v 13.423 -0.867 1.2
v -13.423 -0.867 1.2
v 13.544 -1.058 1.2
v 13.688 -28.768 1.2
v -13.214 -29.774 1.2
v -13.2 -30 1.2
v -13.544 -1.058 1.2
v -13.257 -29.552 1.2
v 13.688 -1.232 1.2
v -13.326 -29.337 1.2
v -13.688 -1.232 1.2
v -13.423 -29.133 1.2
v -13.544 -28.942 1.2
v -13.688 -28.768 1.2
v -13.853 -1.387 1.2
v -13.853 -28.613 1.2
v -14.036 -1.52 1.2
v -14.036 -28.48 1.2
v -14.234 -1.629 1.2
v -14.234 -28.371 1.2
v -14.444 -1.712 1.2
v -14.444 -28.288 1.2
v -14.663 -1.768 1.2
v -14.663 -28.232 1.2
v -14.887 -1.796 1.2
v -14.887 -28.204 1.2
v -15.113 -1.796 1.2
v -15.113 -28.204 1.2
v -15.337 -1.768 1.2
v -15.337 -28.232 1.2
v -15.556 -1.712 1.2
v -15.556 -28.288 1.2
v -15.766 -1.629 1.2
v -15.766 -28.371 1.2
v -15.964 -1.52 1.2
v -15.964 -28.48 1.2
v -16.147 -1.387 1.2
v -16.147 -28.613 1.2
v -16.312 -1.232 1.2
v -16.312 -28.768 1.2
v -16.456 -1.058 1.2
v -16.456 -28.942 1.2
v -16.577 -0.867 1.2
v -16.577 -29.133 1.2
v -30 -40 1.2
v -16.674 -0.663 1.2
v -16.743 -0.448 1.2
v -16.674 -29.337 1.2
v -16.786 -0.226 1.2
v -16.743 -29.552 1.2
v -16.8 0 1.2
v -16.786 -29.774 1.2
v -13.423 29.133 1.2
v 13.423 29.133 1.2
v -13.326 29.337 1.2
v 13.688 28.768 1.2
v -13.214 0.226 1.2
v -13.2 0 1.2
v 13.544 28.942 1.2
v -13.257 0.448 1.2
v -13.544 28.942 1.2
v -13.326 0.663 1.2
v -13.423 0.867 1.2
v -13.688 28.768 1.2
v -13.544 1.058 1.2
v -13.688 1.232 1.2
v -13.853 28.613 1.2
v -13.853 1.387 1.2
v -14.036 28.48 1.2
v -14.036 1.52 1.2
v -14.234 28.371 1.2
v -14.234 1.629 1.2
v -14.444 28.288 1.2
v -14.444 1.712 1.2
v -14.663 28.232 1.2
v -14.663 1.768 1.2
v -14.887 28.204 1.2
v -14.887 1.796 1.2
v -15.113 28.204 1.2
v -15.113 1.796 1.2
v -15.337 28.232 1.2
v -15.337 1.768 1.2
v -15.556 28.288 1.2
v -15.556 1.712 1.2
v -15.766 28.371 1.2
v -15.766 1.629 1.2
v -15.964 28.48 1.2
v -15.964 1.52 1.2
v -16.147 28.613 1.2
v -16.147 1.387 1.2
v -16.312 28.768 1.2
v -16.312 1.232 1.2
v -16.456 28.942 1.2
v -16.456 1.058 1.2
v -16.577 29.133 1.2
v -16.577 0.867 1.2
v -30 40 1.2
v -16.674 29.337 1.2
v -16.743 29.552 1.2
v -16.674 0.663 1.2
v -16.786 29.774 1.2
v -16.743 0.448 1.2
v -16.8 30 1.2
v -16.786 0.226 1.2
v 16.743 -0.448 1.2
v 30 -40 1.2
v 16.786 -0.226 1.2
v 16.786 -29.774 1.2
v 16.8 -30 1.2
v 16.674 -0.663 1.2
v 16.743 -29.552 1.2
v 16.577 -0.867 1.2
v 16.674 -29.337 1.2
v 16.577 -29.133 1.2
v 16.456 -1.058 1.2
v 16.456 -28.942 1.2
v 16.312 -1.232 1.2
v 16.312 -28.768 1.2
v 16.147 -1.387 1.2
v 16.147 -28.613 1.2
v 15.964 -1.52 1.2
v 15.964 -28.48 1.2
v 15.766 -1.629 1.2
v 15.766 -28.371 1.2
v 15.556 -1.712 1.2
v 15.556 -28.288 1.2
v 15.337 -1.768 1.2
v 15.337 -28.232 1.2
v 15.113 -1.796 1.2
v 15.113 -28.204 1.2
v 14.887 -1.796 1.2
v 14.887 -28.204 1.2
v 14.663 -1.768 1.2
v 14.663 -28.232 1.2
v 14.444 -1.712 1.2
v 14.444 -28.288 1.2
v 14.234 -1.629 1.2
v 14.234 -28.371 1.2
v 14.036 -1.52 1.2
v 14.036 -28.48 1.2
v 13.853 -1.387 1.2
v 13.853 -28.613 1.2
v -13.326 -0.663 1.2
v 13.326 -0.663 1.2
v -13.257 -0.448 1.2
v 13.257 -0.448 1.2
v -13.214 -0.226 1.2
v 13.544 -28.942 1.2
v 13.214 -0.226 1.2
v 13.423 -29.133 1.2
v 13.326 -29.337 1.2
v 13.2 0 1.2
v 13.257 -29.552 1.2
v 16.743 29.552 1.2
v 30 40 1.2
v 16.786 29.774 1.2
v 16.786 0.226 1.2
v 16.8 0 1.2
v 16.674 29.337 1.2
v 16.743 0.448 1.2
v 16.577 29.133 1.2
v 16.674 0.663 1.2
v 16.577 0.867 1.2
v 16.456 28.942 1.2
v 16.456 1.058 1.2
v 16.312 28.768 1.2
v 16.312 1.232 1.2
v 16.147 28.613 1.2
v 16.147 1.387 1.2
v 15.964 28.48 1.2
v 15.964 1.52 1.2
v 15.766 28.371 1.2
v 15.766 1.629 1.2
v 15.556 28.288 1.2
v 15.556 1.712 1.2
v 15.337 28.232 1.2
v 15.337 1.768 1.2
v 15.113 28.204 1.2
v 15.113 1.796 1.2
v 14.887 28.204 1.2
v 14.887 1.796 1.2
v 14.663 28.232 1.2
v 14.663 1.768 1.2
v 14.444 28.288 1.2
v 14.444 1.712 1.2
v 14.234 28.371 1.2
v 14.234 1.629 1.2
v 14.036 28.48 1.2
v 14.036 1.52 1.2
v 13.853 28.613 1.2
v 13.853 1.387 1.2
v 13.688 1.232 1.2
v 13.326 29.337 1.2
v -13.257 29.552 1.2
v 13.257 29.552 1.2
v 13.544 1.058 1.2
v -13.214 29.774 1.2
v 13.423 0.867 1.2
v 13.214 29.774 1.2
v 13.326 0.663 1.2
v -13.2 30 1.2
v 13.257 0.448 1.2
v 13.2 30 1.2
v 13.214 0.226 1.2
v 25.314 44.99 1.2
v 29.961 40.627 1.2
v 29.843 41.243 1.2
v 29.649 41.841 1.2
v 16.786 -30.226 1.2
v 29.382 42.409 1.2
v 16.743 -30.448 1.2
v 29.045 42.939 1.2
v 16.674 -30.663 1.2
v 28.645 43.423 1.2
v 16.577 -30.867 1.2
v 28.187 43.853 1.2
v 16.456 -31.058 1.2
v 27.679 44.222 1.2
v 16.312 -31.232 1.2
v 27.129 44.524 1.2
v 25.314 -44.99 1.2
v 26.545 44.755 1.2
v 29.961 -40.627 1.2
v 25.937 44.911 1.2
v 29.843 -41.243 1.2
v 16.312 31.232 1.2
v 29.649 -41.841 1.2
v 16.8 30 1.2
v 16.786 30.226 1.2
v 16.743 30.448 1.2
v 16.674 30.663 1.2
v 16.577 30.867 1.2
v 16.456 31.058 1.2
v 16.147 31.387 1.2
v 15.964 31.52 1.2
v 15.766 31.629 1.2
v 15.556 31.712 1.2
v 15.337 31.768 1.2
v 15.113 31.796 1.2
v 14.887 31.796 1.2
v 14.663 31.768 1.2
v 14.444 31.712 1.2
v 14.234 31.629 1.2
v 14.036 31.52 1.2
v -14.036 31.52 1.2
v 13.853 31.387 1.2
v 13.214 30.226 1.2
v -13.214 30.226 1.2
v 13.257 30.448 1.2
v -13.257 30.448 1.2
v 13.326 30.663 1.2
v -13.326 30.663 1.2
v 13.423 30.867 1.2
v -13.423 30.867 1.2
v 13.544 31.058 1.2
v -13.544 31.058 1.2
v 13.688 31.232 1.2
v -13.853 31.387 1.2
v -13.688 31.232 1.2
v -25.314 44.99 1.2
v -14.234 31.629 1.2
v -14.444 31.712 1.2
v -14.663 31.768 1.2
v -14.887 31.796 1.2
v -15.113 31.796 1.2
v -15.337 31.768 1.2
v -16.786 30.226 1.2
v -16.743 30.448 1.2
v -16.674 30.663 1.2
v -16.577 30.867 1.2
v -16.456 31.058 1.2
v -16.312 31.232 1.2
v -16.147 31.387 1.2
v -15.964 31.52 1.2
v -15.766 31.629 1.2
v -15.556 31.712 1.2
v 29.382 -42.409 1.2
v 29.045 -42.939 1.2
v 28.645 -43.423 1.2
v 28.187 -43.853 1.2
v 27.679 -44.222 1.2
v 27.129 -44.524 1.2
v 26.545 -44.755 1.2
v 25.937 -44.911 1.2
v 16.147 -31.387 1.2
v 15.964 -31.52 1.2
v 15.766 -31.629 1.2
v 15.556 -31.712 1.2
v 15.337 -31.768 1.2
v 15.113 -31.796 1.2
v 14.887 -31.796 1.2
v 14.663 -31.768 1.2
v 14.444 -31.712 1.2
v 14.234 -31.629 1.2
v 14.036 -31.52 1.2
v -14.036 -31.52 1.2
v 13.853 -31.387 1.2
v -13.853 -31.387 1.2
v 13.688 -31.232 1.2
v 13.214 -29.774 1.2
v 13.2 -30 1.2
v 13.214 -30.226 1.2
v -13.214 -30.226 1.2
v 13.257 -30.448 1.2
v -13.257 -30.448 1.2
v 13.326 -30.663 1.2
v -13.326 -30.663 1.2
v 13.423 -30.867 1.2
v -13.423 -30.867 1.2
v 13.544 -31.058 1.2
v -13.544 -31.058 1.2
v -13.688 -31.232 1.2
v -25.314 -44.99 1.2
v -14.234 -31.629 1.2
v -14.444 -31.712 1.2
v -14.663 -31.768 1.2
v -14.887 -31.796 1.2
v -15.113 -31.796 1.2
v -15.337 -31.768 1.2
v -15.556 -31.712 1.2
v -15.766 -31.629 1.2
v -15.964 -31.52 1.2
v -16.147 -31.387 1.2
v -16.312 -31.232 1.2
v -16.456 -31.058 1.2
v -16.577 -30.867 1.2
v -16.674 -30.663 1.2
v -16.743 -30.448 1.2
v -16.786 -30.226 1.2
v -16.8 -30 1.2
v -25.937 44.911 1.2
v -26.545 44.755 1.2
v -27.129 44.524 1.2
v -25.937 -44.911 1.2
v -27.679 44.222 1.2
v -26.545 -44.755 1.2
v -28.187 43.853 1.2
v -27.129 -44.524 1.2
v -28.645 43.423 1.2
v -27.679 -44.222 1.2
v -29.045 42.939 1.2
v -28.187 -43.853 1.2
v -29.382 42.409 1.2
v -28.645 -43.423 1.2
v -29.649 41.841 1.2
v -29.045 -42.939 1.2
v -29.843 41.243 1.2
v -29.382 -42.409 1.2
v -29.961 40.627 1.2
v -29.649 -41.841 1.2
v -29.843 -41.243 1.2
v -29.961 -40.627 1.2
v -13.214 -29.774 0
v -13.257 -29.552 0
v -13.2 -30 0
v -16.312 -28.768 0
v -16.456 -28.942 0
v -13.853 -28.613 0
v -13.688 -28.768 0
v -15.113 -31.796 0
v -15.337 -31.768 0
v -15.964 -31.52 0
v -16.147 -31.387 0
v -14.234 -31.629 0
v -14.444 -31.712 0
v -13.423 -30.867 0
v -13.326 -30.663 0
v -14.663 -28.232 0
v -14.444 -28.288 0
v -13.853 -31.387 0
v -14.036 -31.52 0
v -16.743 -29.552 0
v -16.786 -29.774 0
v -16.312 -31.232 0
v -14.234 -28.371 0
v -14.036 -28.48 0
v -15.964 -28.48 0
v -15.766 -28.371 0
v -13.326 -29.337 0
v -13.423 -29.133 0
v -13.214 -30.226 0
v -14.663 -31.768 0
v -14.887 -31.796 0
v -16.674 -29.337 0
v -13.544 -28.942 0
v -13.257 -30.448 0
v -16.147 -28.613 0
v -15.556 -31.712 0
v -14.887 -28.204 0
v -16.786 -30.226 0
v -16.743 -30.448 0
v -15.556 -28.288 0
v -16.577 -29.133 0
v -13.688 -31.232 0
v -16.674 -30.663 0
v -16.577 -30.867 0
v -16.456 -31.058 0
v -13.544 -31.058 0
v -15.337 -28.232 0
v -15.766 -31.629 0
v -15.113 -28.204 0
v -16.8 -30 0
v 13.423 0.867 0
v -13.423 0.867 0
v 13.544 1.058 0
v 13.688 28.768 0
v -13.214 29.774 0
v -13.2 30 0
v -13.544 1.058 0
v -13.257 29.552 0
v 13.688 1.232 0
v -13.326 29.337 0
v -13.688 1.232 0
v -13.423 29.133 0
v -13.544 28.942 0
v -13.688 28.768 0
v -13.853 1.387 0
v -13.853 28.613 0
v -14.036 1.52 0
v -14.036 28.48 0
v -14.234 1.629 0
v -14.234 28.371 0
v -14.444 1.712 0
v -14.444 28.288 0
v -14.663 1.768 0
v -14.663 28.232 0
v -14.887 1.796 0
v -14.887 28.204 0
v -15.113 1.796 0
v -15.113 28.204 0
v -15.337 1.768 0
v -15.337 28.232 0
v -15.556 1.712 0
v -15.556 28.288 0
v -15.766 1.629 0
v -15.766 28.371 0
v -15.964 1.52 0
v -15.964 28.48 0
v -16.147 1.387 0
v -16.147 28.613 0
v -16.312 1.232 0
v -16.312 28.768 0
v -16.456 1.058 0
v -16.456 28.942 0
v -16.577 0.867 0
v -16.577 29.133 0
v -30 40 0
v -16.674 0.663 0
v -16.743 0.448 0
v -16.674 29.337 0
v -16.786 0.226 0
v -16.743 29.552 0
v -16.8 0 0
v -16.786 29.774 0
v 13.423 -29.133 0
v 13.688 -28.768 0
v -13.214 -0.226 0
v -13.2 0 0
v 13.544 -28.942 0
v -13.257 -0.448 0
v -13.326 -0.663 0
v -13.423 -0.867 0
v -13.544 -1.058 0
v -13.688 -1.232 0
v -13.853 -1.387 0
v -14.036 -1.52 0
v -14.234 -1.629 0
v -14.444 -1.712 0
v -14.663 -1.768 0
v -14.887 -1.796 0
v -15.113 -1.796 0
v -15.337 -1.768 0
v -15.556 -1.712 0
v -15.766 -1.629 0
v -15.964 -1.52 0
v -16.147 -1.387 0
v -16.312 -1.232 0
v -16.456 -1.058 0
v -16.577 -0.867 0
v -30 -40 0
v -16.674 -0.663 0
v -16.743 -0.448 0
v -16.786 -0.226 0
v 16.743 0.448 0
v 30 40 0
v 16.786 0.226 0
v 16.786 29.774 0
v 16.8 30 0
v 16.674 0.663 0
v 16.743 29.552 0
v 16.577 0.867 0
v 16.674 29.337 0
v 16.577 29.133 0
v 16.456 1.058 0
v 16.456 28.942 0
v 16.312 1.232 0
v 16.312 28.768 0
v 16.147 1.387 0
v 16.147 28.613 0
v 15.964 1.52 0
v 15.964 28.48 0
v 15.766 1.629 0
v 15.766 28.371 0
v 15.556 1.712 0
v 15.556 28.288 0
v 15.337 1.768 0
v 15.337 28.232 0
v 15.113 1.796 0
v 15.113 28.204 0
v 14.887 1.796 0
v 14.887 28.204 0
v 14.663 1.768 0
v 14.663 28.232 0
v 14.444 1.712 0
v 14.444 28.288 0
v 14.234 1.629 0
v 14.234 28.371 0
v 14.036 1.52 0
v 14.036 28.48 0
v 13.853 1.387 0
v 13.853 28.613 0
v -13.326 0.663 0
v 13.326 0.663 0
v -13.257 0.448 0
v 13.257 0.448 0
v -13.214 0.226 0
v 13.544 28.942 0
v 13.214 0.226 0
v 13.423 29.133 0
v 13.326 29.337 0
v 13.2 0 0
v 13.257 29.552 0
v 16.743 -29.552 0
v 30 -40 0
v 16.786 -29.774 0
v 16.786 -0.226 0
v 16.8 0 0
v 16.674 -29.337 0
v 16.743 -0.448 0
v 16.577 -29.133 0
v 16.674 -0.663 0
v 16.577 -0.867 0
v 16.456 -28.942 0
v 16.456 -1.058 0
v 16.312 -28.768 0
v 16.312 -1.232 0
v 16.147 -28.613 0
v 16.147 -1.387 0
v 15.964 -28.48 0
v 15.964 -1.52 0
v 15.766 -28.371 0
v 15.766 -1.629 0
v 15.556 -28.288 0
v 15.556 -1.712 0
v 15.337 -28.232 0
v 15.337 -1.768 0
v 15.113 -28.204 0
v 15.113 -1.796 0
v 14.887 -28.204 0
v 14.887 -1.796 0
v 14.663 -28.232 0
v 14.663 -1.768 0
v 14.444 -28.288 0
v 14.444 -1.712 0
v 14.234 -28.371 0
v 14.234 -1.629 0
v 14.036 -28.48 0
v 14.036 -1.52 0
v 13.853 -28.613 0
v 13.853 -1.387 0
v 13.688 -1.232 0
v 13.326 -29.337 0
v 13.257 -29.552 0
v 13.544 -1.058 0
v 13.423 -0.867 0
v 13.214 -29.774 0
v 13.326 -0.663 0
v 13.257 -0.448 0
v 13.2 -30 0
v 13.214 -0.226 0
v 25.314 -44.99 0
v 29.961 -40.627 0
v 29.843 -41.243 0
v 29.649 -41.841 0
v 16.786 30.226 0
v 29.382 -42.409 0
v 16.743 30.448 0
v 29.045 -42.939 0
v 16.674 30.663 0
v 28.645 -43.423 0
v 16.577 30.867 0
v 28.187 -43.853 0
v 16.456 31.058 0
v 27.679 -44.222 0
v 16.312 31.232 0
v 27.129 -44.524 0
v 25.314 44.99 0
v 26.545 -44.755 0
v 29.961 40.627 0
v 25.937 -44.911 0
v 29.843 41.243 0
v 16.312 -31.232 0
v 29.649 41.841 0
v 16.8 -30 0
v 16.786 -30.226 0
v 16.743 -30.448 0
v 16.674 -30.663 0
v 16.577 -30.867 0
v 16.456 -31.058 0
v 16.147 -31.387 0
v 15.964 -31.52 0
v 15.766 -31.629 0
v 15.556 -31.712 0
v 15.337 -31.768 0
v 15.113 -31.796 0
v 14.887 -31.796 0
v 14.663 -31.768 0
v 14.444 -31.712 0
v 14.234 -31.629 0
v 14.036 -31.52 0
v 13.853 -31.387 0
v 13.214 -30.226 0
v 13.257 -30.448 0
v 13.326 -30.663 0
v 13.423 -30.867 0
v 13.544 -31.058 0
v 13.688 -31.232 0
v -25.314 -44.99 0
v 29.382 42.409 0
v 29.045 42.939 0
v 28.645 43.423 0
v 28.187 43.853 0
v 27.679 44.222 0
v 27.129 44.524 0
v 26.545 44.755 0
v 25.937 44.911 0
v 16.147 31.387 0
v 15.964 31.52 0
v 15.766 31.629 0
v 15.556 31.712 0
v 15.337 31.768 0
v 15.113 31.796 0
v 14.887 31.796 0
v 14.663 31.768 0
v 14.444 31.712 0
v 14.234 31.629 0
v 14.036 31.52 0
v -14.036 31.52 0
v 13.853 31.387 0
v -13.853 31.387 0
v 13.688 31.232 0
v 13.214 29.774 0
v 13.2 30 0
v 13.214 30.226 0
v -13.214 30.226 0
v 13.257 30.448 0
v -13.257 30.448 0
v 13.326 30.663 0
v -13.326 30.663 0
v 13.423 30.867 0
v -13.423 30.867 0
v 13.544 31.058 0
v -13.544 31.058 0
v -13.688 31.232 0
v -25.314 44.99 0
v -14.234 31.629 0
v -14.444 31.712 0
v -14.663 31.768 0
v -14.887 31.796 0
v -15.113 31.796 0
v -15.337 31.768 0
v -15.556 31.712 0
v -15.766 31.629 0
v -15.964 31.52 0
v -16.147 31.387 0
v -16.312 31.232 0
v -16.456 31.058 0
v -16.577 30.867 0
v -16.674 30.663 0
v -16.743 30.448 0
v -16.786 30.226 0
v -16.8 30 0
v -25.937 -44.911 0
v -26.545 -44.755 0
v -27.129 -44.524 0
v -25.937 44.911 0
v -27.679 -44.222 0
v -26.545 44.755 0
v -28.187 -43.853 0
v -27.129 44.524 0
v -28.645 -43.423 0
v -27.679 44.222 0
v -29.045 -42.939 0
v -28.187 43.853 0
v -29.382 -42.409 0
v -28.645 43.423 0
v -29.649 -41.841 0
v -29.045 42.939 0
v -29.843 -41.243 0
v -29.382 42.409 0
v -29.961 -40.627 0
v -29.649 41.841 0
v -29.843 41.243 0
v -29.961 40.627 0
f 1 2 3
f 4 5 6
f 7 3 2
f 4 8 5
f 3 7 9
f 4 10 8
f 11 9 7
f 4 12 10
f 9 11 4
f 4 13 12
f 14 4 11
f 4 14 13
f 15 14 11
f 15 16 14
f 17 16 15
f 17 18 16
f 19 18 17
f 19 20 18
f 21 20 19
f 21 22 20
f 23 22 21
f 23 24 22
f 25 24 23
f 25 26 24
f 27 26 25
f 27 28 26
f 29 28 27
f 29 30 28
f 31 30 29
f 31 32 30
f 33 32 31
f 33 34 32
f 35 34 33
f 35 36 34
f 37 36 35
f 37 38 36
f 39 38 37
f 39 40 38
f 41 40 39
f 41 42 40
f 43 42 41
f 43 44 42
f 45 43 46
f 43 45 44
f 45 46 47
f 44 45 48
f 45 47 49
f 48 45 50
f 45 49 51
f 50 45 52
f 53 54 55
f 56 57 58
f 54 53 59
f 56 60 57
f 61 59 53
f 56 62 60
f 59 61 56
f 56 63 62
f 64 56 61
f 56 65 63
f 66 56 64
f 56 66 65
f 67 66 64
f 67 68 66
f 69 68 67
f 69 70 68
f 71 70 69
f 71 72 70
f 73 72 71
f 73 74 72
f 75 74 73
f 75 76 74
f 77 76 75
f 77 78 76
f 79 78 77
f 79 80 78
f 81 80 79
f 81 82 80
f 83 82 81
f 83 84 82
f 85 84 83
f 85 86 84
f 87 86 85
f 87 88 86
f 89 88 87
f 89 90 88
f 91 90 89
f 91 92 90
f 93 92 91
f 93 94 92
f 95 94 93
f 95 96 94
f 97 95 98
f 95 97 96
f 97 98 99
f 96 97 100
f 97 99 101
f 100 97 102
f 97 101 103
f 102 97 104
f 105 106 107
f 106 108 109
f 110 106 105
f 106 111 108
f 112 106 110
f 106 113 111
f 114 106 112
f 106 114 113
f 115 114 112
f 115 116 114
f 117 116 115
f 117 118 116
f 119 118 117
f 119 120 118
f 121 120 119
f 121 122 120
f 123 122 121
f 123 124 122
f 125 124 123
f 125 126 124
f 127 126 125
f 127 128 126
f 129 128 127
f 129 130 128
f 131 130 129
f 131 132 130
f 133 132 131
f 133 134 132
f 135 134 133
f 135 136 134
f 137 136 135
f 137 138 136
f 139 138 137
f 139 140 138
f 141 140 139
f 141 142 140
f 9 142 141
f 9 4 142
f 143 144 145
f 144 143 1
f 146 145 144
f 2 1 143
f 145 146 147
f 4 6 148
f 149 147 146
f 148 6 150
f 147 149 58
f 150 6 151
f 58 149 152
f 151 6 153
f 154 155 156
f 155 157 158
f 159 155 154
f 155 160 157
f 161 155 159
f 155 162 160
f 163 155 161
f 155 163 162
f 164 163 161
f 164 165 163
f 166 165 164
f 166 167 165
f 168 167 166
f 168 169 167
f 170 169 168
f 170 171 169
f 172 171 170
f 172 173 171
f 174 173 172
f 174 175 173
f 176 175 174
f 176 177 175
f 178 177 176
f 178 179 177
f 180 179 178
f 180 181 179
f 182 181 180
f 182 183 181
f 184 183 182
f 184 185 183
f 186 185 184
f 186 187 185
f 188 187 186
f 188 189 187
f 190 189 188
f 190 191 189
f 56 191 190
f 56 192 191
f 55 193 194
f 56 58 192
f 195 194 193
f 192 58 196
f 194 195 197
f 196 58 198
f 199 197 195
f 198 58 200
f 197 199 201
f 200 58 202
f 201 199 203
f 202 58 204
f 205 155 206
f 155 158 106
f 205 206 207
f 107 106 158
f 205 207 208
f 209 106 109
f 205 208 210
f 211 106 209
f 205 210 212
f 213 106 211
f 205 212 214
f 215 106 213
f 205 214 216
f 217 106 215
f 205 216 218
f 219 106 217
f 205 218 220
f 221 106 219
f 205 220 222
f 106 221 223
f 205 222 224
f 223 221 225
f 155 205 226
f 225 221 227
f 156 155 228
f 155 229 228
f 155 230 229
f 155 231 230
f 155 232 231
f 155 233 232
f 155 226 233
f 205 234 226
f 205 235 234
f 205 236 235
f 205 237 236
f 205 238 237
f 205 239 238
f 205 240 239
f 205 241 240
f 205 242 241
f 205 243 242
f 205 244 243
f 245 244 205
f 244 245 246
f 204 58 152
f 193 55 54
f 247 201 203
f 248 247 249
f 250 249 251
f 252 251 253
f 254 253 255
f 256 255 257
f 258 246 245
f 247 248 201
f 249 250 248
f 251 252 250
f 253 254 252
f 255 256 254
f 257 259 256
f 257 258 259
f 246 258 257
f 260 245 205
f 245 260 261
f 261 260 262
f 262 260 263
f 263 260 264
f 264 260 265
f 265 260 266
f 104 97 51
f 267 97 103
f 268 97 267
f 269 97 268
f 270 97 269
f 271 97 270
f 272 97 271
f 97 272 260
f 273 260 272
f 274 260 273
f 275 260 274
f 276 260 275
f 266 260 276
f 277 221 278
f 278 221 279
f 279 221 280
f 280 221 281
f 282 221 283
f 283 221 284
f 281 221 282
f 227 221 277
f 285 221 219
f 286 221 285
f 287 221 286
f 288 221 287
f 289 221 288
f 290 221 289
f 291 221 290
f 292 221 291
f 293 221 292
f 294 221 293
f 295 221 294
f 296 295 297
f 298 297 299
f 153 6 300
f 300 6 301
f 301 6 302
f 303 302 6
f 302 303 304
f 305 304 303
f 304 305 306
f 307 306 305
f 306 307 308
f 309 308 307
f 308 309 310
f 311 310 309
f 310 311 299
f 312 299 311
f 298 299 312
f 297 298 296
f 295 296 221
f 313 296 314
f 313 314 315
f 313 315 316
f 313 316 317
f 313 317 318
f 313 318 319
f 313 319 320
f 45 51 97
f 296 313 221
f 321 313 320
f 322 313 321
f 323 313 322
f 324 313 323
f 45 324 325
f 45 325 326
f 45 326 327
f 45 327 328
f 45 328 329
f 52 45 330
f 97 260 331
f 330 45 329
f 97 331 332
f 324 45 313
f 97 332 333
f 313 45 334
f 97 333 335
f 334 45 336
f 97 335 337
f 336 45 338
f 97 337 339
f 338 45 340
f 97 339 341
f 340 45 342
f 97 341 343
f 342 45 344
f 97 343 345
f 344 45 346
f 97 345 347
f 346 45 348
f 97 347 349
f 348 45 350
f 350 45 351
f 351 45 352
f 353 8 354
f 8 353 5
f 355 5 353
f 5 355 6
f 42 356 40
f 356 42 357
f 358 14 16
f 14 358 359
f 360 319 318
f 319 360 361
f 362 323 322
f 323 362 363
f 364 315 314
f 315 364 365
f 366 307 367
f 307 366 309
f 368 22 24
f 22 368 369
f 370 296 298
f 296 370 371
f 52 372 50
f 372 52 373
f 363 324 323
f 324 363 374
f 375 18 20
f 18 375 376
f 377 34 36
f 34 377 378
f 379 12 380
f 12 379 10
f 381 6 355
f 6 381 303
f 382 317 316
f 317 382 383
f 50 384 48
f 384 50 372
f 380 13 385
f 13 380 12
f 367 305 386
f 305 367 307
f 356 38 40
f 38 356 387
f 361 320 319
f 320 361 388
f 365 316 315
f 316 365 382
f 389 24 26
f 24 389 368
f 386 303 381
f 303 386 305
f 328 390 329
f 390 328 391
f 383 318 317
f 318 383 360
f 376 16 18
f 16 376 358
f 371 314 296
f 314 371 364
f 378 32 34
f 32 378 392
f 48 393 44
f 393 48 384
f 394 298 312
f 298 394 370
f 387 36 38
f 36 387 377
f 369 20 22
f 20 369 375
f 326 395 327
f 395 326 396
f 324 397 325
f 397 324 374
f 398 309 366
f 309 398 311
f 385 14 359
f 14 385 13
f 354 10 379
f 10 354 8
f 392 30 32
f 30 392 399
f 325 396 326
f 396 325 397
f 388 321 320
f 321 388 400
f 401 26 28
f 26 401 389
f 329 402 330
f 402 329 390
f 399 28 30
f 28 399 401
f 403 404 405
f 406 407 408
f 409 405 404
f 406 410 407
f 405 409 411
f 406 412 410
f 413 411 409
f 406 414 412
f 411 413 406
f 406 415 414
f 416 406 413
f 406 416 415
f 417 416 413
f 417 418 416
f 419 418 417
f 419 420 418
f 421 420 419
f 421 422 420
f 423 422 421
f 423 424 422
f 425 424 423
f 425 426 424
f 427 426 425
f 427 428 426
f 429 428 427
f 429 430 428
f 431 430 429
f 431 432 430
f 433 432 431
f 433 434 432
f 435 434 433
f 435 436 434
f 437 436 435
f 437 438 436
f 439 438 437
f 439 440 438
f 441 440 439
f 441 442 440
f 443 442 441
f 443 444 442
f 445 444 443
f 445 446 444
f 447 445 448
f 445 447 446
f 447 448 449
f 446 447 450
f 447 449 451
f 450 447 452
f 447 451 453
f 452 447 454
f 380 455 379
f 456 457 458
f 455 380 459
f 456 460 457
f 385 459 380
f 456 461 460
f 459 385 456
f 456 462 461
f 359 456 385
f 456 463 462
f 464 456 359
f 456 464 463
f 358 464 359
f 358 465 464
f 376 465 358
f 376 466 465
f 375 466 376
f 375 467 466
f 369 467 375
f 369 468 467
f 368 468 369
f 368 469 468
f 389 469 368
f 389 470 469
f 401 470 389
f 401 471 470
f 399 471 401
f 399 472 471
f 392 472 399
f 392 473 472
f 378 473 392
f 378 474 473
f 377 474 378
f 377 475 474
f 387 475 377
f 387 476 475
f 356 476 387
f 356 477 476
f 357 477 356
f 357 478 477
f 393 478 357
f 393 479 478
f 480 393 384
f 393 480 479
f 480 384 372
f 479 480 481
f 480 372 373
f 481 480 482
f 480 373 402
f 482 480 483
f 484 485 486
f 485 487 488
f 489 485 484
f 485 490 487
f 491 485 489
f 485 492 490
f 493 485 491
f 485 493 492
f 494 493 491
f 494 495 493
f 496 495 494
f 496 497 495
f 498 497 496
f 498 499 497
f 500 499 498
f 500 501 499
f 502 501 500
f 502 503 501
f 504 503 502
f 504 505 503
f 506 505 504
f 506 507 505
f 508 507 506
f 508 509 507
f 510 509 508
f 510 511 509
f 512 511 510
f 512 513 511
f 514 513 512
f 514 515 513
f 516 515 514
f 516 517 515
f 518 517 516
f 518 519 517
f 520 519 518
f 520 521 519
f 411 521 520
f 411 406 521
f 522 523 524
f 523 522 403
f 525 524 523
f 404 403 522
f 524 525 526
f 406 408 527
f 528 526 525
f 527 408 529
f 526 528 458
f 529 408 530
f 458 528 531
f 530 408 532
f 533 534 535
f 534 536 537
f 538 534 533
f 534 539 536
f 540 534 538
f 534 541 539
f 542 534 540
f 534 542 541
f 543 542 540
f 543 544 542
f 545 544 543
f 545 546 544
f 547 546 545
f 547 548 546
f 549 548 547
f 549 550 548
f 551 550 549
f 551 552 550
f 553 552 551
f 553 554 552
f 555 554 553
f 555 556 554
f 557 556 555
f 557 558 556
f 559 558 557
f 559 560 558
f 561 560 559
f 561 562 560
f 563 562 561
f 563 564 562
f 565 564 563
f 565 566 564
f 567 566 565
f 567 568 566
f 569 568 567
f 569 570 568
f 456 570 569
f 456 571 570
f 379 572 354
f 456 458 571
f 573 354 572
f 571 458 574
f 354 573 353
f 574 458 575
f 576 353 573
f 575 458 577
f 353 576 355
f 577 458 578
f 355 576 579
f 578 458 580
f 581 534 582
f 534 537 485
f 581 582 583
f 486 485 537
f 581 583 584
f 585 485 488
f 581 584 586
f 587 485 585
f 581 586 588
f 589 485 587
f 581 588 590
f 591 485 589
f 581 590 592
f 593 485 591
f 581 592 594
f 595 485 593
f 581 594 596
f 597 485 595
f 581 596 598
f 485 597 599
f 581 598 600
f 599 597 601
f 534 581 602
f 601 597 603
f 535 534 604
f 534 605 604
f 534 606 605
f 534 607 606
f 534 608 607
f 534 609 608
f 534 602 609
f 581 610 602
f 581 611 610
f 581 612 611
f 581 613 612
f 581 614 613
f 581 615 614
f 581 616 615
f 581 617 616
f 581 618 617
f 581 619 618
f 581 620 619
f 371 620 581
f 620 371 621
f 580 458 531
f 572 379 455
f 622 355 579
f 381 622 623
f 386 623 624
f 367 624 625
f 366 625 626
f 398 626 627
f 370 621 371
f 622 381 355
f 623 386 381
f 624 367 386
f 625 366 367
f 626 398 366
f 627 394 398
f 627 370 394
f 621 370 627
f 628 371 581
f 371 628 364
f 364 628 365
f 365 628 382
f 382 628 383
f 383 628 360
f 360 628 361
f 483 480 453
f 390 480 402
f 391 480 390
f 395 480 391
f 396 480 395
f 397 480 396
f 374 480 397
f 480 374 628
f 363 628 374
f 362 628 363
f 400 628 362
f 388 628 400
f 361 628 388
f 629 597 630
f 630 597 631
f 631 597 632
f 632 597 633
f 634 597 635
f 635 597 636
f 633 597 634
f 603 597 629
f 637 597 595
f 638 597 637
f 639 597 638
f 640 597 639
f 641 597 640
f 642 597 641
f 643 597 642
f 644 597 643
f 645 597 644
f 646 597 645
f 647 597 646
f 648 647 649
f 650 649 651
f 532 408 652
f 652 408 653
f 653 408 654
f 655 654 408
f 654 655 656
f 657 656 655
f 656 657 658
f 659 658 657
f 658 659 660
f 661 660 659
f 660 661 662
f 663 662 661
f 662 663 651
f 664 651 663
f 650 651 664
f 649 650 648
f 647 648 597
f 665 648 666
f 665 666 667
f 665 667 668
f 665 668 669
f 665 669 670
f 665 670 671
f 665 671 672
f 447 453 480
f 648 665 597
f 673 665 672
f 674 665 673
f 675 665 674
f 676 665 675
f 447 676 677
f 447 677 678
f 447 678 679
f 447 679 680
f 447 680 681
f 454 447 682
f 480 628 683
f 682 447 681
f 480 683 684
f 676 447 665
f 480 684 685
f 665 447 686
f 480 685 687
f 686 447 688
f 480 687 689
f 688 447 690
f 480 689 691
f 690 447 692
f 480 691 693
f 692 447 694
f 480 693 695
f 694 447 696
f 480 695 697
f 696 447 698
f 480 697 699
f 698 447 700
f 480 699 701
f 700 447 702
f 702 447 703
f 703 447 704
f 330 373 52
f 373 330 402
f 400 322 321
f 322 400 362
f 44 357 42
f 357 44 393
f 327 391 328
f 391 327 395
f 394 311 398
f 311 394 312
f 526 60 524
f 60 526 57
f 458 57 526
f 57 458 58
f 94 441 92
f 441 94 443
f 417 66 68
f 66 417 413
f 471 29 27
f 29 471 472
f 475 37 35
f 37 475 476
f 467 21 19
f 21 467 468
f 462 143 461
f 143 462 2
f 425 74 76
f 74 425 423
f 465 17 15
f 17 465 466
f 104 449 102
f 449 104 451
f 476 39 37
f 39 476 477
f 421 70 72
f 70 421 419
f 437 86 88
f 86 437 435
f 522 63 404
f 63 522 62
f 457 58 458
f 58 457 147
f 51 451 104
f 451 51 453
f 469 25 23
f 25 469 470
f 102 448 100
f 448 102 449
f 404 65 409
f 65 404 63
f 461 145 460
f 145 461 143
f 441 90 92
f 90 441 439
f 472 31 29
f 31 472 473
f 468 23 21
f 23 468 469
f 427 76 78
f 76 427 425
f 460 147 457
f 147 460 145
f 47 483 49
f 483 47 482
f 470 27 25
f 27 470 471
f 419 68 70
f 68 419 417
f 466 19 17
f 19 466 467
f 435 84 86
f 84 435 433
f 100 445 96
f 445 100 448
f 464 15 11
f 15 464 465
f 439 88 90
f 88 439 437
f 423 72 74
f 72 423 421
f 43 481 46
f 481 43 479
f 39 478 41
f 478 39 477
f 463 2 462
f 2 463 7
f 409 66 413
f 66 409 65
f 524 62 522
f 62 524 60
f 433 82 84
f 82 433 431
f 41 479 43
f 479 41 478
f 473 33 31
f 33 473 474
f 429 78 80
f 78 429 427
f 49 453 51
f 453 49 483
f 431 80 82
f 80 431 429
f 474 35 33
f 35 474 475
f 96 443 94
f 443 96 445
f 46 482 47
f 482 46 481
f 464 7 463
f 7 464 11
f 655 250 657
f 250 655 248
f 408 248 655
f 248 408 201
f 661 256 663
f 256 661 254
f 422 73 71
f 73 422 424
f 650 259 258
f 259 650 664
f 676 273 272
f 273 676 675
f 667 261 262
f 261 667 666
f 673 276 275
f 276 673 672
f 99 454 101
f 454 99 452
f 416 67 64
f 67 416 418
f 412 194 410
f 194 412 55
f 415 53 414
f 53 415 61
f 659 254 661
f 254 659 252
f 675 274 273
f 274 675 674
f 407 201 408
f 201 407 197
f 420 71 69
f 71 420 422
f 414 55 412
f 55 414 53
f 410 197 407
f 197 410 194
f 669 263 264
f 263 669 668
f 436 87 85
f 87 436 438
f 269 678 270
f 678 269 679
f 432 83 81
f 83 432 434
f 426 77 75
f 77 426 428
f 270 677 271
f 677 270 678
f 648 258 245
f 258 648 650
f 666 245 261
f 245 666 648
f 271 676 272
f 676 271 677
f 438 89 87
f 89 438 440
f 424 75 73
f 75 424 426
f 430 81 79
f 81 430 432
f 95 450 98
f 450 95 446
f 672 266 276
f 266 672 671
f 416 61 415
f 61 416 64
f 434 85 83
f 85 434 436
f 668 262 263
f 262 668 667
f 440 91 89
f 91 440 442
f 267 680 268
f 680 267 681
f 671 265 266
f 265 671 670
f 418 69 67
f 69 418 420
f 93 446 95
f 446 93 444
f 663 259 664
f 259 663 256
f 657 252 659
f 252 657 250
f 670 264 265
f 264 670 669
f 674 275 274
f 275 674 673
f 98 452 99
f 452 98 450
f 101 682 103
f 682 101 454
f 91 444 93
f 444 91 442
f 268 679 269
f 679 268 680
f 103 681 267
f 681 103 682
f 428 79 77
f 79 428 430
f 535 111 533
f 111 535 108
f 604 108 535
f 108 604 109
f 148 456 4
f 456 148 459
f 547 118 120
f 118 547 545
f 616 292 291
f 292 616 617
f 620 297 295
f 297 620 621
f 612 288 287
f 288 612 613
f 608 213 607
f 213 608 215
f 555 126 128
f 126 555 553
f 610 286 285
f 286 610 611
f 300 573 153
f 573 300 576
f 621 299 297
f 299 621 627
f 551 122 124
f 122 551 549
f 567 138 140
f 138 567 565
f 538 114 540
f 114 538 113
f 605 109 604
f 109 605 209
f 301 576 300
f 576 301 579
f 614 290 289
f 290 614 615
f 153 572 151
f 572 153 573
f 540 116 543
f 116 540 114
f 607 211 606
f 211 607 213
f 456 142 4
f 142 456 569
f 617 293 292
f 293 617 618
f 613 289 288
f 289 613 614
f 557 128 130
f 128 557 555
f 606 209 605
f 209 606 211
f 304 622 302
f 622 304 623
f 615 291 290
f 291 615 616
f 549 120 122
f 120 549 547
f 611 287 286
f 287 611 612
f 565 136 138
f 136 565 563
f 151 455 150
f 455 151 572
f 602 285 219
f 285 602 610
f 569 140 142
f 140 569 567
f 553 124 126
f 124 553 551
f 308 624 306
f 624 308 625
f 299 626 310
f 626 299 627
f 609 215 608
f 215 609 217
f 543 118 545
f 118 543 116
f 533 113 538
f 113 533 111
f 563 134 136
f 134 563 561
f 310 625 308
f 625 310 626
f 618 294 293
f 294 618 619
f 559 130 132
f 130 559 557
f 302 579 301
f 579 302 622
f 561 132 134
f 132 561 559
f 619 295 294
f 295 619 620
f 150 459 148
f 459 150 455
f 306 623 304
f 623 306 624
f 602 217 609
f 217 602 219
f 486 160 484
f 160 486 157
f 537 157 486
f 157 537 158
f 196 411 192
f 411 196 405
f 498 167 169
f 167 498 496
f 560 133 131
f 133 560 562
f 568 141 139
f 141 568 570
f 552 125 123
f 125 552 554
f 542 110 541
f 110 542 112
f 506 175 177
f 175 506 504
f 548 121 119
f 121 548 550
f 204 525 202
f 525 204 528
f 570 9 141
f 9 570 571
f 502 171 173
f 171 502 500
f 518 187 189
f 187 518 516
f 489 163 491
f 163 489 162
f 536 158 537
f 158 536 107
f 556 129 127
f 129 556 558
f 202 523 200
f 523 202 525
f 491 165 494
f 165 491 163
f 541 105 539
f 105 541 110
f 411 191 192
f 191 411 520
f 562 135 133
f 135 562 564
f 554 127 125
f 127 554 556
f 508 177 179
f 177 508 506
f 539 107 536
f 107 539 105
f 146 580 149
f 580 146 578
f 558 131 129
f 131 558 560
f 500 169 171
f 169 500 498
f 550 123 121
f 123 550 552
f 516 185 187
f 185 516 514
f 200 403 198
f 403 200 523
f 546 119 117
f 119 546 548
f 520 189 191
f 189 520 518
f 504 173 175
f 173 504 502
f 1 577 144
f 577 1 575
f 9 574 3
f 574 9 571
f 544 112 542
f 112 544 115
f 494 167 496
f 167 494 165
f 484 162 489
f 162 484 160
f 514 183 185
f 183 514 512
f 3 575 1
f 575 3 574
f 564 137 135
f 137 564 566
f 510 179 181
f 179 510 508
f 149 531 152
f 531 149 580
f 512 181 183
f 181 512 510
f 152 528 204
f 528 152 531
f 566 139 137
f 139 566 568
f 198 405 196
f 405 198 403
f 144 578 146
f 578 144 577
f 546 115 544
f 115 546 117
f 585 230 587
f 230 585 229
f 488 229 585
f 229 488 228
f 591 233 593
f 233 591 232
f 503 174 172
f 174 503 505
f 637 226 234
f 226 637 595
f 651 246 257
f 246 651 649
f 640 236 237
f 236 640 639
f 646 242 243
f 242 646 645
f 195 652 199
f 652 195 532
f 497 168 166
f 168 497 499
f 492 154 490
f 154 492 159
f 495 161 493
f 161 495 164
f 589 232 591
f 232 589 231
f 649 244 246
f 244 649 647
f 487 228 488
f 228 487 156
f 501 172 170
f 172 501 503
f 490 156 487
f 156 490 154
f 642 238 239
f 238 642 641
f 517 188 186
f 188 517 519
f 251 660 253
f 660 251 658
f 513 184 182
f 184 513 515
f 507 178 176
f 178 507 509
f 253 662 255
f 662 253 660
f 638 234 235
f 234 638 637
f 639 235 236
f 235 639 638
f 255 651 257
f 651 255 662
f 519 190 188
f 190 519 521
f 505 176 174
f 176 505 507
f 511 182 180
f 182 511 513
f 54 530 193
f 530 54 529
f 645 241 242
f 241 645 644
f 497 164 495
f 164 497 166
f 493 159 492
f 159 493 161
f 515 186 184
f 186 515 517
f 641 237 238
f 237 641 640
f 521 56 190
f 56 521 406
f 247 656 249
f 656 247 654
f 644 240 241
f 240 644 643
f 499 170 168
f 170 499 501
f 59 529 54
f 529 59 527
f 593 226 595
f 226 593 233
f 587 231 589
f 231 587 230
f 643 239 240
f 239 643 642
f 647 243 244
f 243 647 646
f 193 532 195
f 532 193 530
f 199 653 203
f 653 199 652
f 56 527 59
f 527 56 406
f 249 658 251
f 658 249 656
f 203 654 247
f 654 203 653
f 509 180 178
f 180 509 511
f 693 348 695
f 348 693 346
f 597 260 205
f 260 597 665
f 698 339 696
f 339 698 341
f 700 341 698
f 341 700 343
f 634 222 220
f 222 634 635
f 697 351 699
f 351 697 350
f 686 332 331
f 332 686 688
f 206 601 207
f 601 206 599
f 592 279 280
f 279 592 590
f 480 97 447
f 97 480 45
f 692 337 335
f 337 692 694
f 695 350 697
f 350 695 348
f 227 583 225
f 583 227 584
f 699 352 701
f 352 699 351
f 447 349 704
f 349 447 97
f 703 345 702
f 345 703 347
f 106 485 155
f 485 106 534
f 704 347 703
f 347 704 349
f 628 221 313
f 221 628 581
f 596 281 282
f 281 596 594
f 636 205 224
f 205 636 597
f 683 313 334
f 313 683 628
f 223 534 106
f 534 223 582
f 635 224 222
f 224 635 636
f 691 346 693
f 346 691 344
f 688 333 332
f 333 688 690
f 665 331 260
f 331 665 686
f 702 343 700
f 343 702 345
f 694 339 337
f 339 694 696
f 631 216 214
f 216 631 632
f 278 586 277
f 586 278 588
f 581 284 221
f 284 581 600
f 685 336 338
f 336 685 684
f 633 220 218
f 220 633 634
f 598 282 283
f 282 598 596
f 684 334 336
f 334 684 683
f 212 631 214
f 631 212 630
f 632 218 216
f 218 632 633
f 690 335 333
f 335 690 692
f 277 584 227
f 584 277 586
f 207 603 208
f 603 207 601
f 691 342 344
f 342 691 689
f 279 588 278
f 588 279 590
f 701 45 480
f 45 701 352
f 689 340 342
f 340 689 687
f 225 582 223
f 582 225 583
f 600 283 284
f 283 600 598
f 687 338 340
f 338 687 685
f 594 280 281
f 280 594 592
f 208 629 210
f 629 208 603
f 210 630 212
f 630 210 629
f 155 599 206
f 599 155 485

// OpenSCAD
$fn = 50;


difference() {
	union() {
		hull() {
			translate(v = [-25.0000000000, 40.0000000000, 0]) {
				cylinder(h = 27, r = 5);
			}
			translate(v = [25.0000000000, 40.0000000000, 0]) {
				cylinder(h = 27, r = 5);
			}
			translate(v = [-25.0000000000, -40.0000000000, 0]) {
				cylinder(h = 27, r = 5);
			}
			translate(v = [25.0000000000, -40.0000000000, 0]) {
				cylinder(h = 27, r = 5);
			}
		}
	}
	union() {
		translate(v = [0, 0, 1.2000000000]) {
			hull() {
				translate(v = [-25.0000000000, 40.0000000000, 0]) {
					cylinder(h = 25.8000000000, r = 3.8000000000);
				}
				translate(v = [25.0000000000, 40.0000000000, 0]) {
					cylinder(h = 25.8000000000, r = 3.8000000000);
				}
				translate(v = [-25.0000000000, -40.0000000000, 0]) {
					cylinder(h = 25.8000000000, r = 3.8000000000);
				}
				translate(v = [25.0000000000, -40.0000000000, 0]) {
					cylinder(h = 25.8000000000, r = 3.8000000000);
				}
			}
		}
		#translate(v = [-15.0000000000, -30.0000000000, 0]) {
			cylinder(h = 1.2000000000, r = 1.8000000000);
		}
		#translate(v = [-15.0000000000, 0.0000000000, 0]) {
			cylinder(h = 1.2000000000, r = 1.8000000000);
		}
		#translate(v = [-15.0000000000, 30.0000000000, 0]) {
			cylinder(h = 1.2000000000, r = 1.8000000000);
		}
		#translate(v = [15.0000000000, -30.0000000000, 0]) {
			cylinder(h = 1.2000000000, r = 1.8000000000);
		}
		#translate(v = [15.0000000000, 0.0000000000, 0]) {
			cylinder(h = 1.2000000000, r = 1.8000000000);
		}
		#translate(v = [15.0000000000, 30.0000000000, 0]) {
			cylinder(h = 1.2000000000, r = 1.8000000000);
		}
		translate(v = [-250.0000000000, -250.0000000000, 1.2000000000]) {
			cube(size = [500, 500, 500]);
		}
		translate(v = [-250.0000000000, -250.0000000000, 1.2000000000]) {
			cube(size = [500, 500, 500]);
		}
		translate(v = [-250.0000000000, -250.0000000000, 1.2000000000]) {
			cube(size = [500, 500, 500]);
		}
	}
}
